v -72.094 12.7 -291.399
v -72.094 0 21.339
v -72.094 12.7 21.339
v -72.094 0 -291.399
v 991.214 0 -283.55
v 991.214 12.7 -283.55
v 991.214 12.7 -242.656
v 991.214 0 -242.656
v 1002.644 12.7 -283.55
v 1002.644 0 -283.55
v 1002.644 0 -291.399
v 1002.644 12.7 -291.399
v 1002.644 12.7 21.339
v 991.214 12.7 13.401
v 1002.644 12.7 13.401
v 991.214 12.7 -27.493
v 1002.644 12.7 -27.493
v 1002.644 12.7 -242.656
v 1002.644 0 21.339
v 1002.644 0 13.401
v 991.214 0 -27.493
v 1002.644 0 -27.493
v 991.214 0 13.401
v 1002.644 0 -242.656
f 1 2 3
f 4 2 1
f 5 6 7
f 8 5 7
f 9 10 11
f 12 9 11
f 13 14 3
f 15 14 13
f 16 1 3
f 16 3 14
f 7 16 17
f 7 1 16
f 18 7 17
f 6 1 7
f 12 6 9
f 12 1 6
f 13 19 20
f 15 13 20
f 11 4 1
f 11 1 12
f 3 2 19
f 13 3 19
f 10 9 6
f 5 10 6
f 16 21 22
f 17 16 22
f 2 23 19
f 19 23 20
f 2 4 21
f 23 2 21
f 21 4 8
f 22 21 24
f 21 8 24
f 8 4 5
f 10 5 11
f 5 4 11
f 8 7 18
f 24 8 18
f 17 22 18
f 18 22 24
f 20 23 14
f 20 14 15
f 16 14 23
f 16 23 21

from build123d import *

# Parameters (mm, degrees)
SKETCH1_W           = 1074.7375
SKETCH1_H           = 312.7375
BOSS_EXTRUDE1_DEPTH = 12.7
SKETCH2_W           = 11.43
SKETCH2_H           = 40.894
CUT_EXTRUDE2_DEPTH  = 1045.207476152


with BuildPart() as part:
    # Sketch1 → Boss-Extrude1 (new body)
    with BuildSketch(Plane(origin=(0, 0, 0), x_dir=(1, 0, 0), z_dir=(0, 1, 0))):
        with Locations((465.275120786, 135.030000216)):
            Rectangle(SKETCH1_W, SKETCH1_H)
    extrude(amount=BOSS_EXTRUDE1_DEPTH)

    # Sketch2 → Cut-Extrude2 (cut, through all)
    with BuildSketch(Plane(origin=(0, 12.7, 0), x_dir=(1, 0, 0), z_dir=(0, 1, 0))):
        Polygon((1002.643870786, 283.550150216), (991.213870786, 283.550150216), (991.213870786, 242.656150216), (1002.643870786, 242.656150216), (1002.643870786, 253.768650216), align=None)
        with Locations((996.928870786, 7.045750216)):
            Rectangle(SKETCH2_W, SKETCH2_H)
    extrude(amount=-CUT_EXTRUDE2_DEPTH, mode=Mode.SUBTRACT)


solid = part.part
